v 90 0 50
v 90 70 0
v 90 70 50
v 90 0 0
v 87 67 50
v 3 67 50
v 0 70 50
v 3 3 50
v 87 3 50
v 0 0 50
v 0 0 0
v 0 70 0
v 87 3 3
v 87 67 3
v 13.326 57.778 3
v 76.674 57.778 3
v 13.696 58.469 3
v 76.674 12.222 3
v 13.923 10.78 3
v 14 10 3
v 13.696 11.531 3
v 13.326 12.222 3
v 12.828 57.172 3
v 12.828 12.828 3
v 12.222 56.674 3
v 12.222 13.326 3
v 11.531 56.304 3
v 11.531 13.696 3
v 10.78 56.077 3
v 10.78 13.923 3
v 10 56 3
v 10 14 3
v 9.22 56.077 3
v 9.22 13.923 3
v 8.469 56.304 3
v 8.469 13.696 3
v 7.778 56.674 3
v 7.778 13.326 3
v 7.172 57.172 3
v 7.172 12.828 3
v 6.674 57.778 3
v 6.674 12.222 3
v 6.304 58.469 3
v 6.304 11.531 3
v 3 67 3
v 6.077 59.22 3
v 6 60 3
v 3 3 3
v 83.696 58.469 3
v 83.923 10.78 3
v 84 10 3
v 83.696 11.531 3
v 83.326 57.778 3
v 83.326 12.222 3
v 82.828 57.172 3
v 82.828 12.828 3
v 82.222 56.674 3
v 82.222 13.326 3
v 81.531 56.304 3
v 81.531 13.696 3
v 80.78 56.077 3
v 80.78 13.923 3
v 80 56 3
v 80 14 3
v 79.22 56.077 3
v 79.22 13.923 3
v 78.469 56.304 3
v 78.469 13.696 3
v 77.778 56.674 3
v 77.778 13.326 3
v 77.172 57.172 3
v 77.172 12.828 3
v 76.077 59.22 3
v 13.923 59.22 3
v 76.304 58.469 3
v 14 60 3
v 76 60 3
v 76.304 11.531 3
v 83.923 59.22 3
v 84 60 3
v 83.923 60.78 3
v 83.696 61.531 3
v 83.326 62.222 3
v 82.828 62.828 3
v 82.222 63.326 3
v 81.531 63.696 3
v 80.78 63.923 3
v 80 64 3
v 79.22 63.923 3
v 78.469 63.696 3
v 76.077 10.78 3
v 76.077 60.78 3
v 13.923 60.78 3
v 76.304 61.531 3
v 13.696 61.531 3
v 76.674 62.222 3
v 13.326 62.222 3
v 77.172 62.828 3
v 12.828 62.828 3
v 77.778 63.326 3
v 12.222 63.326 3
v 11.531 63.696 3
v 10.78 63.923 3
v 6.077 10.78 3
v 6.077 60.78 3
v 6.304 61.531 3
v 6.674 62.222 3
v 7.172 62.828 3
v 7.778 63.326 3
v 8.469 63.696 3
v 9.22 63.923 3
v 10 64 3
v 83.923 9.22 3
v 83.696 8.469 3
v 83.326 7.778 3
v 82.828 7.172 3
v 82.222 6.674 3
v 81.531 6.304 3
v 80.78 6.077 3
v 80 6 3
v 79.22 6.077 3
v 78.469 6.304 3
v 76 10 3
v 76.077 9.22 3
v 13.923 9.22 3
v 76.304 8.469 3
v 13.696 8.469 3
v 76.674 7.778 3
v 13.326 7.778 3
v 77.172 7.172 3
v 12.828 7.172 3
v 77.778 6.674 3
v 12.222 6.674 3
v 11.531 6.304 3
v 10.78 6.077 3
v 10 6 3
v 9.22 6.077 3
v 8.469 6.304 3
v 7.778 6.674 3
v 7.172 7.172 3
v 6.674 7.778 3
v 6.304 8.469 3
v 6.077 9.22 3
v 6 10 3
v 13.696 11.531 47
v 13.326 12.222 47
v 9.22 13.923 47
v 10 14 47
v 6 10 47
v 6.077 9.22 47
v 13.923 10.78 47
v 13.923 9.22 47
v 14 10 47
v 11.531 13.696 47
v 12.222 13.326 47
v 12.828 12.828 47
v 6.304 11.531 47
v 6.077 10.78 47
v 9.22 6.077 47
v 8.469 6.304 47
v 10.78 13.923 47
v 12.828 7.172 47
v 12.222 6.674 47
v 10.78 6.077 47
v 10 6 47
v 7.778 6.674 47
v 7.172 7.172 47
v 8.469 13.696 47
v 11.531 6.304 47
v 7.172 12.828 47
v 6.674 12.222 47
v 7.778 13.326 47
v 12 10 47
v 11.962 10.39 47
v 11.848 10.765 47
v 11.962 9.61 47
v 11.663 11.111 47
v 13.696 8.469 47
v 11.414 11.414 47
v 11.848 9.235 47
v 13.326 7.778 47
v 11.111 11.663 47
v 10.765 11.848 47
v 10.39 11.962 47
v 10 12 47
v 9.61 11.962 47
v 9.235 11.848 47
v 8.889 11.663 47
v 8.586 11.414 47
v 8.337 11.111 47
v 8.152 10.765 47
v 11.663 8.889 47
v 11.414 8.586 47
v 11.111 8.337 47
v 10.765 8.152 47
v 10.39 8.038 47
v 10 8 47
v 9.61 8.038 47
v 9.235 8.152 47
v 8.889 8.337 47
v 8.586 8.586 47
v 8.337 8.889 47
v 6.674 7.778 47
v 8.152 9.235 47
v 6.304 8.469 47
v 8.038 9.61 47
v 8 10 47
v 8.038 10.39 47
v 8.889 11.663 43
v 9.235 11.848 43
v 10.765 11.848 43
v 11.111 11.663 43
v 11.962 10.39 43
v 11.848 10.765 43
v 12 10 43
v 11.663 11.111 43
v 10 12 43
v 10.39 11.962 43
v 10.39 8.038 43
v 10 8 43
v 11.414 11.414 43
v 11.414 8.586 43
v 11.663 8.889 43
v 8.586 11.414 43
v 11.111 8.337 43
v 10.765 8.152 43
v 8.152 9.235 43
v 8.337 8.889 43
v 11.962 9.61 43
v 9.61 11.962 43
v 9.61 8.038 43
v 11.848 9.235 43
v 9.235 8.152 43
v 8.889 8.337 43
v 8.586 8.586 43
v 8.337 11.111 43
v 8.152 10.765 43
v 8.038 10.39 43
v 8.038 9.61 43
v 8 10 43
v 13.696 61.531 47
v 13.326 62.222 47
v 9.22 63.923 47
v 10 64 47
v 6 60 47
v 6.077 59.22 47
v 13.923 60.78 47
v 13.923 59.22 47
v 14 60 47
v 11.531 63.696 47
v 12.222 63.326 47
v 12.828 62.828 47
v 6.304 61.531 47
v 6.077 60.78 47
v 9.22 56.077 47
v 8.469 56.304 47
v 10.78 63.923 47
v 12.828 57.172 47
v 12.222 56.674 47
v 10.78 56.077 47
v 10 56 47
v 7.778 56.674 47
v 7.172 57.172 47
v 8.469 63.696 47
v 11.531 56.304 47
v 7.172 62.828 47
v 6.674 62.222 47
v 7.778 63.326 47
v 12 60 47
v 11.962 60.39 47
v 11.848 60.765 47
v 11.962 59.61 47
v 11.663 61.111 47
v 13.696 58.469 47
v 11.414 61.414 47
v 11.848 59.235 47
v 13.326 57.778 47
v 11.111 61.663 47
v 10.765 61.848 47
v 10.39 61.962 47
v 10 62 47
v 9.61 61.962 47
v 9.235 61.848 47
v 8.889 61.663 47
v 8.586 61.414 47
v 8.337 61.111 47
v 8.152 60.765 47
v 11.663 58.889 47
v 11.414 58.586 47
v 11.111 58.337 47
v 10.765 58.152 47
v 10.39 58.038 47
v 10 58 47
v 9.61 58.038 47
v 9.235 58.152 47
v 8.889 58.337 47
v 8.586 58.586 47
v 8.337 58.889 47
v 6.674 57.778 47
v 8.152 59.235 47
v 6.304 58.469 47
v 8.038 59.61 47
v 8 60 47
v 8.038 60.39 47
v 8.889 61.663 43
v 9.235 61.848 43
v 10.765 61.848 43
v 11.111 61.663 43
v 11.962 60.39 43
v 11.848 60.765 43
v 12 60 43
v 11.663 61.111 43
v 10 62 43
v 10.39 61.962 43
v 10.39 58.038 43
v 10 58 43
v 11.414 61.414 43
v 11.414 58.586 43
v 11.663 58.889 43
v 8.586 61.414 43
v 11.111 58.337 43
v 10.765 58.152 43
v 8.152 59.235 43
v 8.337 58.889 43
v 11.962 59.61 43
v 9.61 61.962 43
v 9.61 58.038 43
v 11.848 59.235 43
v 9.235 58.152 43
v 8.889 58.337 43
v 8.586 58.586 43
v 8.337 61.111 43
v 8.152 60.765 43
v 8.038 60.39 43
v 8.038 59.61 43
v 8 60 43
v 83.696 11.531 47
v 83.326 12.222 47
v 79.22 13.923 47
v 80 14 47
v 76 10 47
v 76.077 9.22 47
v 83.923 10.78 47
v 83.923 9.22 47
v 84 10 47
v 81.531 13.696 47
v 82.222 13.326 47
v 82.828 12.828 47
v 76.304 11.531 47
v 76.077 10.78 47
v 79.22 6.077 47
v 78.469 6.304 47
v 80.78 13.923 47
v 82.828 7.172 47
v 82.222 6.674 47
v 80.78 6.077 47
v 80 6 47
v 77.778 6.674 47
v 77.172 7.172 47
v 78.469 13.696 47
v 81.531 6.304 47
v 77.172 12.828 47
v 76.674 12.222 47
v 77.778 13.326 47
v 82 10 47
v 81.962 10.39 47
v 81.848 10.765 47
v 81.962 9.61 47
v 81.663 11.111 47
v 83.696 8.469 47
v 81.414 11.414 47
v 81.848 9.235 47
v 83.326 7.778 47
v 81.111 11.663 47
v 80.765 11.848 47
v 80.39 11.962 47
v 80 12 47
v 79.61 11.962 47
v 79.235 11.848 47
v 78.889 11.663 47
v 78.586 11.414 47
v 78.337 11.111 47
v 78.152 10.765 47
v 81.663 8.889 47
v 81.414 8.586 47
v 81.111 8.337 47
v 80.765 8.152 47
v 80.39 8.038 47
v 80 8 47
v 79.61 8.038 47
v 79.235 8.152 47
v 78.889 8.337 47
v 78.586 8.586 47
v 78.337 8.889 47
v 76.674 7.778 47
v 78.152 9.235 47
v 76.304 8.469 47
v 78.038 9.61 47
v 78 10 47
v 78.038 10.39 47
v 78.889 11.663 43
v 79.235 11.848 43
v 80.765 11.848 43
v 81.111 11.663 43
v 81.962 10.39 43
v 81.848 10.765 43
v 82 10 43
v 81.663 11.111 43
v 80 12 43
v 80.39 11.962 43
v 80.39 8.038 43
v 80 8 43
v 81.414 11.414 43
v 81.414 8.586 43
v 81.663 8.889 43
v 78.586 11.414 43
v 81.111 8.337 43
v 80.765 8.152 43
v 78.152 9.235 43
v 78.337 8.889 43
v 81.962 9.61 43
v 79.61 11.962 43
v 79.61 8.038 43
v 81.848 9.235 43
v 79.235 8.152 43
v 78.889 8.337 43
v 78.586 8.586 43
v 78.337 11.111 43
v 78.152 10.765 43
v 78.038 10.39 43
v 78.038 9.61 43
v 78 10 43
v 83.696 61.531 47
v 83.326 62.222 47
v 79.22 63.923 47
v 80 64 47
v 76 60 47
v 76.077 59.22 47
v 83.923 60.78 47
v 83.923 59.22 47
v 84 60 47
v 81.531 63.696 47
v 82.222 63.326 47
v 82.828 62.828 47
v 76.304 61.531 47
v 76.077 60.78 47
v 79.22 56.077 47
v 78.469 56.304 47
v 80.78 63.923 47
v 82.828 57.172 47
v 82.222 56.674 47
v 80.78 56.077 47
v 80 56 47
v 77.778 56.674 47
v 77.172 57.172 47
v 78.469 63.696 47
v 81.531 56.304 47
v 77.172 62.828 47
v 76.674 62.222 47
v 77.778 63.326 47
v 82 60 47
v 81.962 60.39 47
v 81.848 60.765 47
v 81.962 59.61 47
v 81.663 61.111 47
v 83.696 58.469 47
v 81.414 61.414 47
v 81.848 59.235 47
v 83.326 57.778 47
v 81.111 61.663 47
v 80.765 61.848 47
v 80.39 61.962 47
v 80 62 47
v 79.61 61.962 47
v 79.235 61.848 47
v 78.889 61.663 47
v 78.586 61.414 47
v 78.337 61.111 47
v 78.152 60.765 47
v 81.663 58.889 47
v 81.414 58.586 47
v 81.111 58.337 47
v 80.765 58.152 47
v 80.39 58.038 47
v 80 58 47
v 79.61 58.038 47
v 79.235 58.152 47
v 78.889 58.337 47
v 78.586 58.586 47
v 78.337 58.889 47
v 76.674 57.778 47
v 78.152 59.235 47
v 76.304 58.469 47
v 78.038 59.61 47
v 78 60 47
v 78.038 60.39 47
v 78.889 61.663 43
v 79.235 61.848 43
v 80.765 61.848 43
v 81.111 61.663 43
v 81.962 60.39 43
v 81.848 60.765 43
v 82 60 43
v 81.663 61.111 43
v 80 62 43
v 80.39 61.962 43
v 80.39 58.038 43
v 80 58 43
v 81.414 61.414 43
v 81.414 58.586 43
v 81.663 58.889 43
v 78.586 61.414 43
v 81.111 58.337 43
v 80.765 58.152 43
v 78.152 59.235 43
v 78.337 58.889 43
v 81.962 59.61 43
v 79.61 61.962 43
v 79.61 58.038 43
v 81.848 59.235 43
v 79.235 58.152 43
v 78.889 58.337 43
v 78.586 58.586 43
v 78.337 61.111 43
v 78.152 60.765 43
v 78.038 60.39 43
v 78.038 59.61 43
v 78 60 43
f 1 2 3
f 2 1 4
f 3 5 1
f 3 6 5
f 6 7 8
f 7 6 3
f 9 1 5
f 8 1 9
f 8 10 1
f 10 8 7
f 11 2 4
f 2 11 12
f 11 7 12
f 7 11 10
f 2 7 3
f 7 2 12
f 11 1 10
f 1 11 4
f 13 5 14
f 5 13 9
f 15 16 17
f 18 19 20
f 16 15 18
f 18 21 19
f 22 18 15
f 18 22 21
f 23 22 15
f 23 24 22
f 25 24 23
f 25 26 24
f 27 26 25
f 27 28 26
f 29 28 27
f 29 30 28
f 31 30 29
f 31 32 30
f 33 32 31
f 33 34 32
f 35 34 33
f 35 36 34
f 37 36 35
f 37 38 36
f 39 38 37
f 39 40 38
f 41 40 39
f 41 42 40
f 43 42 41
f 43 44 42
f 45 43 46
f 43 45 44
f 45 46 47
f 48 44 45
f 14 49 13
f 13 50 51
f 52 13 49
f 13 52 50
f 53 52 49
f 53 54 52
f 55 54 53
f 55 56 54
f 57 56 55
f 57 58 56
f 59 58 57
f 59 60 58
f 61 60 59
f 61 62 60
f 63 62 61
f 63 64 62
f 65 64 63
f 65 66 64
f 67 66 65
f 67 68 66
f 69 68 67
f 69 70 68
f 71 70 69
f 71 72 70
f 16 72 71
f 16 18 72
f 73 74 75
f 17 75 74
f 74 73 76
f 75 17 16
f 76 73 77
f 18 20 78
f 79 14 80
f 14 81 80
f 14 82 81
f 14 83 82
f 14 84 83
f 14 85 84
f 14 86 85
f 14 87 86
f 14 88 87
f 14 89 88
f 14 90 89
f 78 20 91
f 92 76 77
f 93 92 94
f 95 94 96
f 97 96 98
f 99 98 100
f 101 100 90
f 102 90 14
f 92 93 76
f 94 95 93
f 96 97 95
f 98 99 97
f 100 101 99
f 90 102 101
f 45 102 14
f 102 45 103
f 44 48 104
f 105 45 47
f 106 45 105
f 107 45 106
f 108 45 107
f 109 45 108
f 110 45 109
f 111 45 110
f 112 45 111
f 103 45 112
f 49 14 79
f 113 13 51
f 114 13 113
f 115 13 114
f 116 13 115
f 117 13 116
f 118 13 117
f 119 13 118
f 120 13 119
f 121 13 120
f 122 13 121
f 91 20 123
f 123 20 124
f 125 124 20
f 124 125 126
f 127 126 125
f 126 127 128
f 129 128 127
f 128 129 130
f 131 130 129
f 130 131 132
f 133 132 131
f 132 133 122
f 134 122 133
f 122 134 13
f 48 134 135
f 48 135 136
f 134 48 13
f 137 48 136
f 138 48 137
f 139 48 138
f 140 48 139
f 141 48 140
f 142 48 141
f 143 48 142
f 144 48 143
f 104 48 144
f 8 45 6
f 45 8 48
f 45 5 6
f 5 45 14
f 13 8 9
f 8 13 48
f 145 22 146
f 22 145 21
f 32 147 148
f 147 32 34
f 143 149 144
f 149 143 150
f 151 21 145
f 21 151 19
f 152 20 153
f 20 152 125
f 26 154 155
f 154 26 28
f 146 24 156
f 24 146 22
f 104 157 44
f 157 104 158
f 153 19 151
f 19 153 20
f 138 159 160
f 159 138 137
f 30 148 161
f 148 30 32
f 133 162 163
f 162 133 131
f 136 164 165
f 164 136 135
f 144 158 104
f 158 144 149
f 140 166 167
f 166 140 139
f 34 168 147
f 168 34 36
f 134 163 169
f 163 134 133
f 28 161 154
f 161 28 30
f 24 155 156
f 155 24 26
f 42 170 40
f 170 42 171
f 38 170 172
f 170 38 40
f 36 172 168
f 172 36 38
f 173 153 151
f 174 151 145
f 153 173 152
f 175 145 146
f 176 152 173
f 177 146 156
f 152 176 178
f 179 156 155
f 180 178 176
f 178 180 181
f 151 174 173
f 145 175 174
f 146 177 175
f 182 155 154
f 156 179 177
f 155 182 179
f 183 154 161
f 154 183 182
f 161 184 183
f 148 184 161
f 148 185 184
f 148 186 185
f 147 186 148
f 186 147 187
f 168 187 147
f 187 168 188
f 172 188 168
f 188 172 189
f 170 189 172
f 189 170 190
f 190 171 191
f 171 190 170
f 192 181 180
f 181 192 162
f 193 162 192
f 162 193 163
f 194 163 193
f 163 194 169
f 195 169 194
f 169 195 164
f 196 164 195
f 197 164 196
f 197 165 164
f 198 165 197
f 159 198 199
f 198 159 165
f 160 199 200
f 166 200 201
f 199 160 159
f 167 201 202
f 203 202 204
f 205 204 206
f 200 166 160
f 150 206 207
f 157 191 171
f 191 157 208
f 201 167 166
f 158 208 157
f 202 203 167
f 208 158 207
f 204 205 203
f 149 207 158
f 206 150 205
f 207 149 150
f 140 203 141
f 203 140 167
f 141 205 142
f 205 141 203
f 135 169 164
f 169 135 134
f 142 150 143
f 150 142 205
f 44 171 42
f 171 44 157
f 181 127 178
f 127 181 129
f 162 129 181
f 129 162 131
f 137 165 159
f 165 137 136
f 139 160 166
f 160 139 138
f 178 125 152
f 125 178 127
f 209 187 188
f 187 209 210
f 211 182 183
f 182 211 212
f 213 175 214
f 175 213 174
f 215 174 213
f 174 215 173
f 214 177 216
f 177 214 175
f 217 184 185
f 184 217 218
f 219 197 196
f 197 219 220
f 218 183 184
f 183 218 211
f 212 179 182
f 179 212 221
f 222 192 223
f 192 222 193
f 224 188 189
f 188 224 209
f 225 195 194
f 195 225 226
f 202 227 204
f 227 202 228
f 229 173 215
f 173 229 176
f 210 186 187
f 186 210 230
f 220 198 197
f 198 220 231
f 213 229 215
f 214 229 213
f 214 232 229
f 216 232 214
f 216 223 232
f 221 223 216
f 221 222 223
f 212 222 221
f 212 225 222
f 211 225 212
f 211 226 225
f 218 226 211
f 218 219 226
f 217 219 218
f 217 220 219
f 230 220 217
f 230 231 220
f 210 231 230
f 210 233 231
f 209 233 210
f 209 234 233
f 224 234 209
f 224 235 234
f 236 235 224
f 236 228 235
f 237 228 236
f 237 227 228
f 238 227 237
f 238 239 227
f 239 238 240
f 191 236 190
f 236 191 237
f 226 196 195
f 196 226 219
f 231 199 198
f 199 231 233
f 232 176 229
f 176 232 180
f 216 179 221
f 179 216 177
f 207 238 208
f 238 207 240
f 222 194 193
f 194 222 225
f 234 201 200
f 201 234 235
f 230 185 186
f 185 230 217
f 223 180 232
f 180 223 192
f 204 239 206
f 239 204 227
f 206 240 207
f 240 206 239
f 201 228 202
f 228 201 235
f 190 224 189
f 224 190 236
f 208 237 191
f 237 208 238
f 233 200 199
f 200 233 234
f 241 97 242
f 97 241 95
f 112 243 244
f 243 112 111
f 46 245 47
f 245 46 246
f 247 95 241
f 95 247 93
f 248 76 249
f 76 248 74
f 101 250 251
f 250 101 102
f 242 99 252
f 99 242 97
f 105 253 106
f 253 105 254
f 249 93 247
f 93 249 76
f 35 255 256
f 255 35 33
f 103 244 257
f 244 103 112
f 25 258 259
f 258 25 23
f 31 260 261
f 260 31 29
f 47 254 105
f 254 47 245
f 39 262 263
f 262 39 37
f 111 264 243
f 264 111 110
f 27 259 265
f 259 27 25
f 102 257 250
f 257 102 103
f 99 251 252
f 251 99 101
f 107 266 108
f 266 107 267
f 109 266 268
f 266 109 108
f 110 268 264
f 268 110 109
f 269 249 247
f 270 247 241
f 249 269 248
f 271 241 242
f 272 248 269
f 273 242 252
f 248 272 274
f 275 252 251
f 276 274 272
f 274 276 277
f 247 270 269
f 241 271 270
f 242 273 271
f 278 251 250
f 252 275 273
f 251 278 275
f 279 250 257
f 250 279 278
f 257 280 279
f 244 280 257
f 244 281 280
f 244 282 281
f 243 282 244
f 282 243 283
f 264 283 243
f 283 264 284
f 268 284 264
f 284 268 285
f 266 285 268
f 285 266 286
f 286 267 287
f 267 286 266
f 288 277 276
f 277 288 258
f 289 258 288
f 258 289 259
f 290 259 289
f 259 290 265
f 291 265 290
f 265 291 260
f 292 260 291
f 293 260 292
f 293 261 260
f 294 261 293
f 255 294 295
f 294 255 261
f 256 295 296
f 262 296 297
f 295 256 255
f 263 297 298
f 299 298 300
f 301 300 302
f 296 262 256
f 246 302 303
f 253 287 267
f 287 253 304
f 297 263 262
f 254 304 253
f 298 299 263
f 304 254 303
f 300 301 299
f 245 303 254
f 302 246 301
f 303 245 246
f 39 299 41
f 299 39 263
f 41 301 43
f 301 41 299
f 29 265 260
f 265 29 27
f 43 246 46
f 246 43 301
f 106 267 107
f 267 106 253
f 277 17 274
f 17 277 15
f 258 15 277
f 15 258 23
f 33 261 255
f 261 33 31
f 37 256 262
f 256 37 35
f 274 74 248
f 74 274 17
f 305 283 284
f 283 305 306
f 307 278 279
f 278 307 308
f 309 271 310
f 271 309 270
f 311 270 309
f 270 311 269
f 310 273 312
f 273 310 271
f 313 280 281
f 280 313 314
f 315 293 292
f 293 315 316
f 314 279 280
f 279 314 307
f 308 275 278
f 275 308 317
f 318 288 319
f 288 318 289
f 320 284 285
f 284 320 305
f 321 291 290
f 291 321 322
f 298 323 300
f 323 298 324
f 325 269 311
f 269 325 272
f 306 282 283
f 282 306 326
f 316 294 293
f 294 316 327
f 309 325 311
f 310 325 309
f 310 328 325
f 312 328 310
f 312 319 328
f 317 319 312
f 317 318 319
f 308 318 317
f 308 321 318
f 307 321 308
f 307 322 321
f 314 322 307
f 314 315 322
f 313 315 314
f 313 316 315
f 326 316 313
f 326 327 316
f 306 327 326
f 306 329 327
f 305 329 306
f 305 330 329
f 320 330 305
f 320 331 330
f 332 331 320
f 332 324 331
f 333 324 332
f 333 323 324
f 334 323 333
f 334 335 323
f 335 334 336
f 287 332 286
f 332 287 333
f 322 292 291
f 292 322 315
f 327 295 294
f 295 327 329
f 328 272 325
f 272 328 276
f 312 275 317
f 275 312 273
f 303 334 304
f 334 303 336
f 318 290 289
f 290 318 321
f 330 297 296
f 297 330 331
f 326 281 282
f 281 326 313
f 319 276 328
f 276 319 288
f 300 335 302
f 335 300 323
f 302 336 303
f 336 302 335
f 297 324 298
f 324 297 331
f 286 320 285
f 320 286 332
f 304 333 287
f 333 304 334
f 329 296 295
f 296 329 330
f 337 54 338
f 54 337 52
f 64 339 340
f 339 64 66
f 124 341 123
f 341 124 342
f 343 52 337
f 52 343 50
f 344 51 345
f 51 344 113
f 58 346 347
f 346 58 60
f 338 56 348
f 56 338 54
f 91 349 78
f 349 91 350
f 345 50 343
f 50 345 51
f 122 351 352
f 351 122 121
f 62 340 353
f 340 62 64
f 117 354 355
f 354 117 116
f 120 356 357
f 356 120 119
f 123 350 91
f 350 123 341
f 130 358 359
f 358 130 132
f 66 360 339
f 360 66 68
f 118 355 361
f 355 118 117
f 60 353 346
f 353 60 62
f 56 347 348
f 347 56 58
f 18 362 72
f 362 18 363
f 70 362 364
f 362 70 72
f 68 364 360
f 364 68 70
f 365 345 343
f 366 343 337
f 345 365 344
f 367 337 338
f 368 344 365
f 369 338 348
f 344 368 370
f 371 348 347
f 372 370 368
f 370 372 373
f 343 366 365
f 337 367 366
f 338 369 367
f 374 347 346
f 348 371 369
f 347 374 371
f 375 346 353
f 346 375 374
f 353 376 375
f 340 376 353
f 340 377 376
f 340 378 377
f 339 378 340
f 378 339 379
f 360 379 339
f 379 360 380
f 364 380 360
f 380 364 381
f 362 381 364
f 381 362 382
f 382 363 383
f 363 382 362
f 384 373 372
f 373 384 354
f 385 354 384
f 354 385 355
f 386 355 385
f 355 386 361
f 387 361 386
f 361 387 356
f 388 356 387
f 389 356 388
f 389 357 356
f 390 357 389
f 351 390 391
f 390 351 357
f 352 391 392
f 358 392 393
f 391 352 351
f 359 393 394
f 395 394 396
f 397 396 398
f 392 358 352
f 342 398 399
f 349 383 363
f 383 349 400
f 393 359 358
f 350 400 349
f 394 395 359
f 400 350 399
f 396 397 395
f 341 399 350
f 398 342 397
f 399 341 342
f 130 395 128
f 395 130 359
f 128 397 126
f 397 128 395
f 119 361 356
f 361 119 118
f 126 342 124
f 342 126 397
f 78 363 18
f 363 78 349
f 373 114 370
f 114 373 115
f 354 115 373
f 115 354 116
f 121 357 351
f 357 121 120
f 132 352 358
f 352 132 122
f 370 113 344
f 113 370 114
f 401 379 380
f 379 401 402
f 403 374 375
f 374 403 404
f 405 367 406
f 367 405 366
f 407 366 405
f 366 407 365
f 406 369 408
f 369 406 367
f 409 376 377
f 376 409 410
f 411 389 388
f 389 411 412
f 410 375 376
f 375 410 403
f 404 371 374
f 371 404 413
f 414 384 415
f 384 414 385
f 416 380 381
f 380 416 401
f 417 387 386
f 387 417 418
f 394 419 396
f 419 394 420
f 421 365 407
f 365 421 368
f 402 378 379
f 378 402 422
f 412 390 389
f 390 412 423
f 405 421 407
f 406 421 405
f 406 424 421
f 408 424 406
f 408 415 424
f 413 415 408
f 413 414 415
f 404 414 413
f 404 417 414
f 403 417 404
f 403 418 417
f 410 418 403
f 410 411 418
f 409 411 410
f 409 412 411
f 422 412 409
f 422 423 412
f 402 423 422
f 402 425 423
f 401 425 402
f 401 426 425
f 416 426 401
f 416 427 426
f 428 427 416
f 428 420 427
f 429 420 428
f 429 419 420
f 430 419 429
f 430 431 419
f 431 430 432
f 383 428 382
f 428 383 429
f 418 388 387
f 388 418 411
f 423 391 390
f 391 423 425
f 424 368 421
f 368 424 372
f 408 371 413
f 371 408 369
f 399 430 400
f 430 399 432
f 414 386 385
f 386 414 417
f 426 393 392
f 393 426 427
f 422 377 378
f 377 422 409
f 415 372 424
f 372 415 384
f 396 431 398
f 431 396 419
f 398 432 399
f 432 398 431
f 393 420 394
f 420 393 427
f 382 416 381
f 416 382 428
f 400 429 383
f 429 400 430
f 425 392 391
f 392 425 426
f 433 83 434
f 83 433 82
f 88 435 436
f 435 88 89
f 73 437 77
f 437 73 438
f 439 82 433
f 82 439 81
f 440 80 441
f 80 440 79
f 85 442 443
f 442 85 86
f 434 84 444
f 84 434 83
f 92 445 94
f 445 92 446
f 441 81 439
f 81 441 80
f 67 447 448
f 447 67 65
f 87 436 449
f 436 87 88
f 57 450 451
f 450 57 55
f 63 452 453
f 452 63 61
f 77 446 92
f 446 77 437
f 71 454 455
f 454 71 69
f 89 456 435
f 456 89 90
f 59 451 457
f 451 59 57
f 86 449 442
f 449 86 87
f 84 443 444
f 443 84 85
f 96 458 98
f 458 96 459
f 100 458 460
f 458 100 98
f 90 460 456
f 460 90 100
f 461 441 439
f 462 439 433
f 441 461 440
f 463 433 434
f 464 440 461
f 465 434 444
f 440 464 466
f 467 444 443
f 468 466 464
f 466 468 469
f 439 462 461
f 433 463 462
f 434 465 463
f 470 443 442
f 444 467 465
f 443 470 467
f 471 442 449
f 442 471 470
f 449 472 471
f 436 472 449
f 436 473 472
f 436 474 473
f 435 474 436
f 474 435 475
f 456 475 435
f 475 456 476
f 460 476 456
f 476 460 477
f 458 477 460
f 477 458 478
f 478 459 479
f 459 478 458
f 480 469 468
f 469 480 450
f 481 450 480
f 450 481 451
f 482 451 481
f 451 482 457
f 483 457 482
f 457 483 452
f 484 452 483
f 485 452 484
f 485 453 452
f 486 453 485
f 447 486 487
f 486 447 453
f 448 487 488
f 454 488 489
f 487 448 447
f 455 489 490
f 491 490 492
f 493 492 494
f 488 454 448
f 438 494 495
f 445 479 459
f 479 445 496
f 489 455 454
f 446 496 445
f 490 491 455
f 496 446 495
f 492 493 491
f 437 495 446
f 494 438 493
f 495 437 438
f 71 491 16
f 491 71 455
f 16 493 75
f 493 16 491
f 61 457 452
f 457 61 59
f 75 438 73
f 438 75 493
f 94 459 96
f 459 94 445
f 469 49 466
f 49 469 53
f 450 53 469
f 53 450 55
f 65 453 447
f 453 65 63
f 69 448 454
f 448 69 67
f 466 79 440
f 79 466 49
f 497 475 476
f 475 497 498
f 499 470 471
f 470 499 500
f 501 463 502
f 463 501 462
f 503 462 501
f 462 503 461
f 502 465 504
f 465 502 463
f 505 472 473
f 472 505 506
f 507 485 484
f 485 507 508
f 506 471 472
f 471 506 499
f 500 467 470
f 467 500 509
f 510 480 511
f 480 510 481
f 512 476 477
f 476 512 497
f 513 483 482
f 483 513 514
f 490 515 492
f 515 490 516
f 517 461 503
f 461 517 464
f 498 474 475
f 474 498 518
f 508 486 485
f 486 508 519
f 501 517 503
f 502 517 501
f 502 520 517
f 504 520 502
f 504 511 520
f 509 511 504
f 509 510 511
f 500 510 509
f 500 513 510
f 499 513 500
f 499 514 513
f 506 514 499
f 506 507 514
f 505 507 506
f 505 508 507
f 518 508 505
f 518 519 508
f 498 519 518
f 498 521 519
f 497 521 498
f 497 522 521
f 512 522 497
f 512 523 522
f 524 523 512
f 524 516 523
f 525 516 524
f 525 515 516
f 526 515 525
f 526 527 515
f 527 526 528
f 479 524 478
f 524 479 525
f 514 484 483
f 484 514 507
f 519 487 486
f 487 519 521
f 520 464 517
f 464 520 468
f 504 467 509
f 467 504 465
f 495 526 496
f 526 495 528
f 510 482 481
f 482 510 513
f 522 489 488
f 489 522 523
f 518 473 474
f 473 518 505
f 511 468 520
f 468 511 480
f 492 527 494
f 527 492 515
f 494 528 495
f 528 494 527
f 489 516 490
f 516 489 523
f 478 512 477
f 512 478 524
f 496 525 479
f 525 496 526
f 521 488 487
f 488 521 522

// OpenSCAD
$fn = 32;

// ----------------------------------------------------------------------
// Enclosure box: bosses enclosure
// ----------------------------------------------------------------------

// --- parameters (mm) ---
box_l = 90;               // outer length, X
box_w = 70;               // outer width, Y
box_h = 50;               // outer height
wall_t = 3;               // wall thickness
boss_r = 4;               // corner boss radius
hole_r = 2;               // boss screw hole radius
boss_in = 10;             // boss inset from the corners

inner_h = box_h - wall_t;  // cavity depth
boss_h = inner_h - 2;  // corner boss height

difference() {
  union() {
    difference() {
      cube([box_l, box_w, box_h]);
      translate([wall_t, wall_t, wall_t])
        cube([box_l - 2 * wall_t, box_w - 2 * wall_t, box_h]);
    }
    for (sx = [0, 1], sy = [0, 1])
      translate([sx ? box_l - boss_in : boss_in,
                 sy ? box_w - boss_in : boss_in, wall_t - 1])
        difference() {
          cylinder(r = boss_r, h = boss_h);
          translate([0, 0, boss_h - 4])
            cylinder(r = hole_r, h = 5);
        }
  }
}
